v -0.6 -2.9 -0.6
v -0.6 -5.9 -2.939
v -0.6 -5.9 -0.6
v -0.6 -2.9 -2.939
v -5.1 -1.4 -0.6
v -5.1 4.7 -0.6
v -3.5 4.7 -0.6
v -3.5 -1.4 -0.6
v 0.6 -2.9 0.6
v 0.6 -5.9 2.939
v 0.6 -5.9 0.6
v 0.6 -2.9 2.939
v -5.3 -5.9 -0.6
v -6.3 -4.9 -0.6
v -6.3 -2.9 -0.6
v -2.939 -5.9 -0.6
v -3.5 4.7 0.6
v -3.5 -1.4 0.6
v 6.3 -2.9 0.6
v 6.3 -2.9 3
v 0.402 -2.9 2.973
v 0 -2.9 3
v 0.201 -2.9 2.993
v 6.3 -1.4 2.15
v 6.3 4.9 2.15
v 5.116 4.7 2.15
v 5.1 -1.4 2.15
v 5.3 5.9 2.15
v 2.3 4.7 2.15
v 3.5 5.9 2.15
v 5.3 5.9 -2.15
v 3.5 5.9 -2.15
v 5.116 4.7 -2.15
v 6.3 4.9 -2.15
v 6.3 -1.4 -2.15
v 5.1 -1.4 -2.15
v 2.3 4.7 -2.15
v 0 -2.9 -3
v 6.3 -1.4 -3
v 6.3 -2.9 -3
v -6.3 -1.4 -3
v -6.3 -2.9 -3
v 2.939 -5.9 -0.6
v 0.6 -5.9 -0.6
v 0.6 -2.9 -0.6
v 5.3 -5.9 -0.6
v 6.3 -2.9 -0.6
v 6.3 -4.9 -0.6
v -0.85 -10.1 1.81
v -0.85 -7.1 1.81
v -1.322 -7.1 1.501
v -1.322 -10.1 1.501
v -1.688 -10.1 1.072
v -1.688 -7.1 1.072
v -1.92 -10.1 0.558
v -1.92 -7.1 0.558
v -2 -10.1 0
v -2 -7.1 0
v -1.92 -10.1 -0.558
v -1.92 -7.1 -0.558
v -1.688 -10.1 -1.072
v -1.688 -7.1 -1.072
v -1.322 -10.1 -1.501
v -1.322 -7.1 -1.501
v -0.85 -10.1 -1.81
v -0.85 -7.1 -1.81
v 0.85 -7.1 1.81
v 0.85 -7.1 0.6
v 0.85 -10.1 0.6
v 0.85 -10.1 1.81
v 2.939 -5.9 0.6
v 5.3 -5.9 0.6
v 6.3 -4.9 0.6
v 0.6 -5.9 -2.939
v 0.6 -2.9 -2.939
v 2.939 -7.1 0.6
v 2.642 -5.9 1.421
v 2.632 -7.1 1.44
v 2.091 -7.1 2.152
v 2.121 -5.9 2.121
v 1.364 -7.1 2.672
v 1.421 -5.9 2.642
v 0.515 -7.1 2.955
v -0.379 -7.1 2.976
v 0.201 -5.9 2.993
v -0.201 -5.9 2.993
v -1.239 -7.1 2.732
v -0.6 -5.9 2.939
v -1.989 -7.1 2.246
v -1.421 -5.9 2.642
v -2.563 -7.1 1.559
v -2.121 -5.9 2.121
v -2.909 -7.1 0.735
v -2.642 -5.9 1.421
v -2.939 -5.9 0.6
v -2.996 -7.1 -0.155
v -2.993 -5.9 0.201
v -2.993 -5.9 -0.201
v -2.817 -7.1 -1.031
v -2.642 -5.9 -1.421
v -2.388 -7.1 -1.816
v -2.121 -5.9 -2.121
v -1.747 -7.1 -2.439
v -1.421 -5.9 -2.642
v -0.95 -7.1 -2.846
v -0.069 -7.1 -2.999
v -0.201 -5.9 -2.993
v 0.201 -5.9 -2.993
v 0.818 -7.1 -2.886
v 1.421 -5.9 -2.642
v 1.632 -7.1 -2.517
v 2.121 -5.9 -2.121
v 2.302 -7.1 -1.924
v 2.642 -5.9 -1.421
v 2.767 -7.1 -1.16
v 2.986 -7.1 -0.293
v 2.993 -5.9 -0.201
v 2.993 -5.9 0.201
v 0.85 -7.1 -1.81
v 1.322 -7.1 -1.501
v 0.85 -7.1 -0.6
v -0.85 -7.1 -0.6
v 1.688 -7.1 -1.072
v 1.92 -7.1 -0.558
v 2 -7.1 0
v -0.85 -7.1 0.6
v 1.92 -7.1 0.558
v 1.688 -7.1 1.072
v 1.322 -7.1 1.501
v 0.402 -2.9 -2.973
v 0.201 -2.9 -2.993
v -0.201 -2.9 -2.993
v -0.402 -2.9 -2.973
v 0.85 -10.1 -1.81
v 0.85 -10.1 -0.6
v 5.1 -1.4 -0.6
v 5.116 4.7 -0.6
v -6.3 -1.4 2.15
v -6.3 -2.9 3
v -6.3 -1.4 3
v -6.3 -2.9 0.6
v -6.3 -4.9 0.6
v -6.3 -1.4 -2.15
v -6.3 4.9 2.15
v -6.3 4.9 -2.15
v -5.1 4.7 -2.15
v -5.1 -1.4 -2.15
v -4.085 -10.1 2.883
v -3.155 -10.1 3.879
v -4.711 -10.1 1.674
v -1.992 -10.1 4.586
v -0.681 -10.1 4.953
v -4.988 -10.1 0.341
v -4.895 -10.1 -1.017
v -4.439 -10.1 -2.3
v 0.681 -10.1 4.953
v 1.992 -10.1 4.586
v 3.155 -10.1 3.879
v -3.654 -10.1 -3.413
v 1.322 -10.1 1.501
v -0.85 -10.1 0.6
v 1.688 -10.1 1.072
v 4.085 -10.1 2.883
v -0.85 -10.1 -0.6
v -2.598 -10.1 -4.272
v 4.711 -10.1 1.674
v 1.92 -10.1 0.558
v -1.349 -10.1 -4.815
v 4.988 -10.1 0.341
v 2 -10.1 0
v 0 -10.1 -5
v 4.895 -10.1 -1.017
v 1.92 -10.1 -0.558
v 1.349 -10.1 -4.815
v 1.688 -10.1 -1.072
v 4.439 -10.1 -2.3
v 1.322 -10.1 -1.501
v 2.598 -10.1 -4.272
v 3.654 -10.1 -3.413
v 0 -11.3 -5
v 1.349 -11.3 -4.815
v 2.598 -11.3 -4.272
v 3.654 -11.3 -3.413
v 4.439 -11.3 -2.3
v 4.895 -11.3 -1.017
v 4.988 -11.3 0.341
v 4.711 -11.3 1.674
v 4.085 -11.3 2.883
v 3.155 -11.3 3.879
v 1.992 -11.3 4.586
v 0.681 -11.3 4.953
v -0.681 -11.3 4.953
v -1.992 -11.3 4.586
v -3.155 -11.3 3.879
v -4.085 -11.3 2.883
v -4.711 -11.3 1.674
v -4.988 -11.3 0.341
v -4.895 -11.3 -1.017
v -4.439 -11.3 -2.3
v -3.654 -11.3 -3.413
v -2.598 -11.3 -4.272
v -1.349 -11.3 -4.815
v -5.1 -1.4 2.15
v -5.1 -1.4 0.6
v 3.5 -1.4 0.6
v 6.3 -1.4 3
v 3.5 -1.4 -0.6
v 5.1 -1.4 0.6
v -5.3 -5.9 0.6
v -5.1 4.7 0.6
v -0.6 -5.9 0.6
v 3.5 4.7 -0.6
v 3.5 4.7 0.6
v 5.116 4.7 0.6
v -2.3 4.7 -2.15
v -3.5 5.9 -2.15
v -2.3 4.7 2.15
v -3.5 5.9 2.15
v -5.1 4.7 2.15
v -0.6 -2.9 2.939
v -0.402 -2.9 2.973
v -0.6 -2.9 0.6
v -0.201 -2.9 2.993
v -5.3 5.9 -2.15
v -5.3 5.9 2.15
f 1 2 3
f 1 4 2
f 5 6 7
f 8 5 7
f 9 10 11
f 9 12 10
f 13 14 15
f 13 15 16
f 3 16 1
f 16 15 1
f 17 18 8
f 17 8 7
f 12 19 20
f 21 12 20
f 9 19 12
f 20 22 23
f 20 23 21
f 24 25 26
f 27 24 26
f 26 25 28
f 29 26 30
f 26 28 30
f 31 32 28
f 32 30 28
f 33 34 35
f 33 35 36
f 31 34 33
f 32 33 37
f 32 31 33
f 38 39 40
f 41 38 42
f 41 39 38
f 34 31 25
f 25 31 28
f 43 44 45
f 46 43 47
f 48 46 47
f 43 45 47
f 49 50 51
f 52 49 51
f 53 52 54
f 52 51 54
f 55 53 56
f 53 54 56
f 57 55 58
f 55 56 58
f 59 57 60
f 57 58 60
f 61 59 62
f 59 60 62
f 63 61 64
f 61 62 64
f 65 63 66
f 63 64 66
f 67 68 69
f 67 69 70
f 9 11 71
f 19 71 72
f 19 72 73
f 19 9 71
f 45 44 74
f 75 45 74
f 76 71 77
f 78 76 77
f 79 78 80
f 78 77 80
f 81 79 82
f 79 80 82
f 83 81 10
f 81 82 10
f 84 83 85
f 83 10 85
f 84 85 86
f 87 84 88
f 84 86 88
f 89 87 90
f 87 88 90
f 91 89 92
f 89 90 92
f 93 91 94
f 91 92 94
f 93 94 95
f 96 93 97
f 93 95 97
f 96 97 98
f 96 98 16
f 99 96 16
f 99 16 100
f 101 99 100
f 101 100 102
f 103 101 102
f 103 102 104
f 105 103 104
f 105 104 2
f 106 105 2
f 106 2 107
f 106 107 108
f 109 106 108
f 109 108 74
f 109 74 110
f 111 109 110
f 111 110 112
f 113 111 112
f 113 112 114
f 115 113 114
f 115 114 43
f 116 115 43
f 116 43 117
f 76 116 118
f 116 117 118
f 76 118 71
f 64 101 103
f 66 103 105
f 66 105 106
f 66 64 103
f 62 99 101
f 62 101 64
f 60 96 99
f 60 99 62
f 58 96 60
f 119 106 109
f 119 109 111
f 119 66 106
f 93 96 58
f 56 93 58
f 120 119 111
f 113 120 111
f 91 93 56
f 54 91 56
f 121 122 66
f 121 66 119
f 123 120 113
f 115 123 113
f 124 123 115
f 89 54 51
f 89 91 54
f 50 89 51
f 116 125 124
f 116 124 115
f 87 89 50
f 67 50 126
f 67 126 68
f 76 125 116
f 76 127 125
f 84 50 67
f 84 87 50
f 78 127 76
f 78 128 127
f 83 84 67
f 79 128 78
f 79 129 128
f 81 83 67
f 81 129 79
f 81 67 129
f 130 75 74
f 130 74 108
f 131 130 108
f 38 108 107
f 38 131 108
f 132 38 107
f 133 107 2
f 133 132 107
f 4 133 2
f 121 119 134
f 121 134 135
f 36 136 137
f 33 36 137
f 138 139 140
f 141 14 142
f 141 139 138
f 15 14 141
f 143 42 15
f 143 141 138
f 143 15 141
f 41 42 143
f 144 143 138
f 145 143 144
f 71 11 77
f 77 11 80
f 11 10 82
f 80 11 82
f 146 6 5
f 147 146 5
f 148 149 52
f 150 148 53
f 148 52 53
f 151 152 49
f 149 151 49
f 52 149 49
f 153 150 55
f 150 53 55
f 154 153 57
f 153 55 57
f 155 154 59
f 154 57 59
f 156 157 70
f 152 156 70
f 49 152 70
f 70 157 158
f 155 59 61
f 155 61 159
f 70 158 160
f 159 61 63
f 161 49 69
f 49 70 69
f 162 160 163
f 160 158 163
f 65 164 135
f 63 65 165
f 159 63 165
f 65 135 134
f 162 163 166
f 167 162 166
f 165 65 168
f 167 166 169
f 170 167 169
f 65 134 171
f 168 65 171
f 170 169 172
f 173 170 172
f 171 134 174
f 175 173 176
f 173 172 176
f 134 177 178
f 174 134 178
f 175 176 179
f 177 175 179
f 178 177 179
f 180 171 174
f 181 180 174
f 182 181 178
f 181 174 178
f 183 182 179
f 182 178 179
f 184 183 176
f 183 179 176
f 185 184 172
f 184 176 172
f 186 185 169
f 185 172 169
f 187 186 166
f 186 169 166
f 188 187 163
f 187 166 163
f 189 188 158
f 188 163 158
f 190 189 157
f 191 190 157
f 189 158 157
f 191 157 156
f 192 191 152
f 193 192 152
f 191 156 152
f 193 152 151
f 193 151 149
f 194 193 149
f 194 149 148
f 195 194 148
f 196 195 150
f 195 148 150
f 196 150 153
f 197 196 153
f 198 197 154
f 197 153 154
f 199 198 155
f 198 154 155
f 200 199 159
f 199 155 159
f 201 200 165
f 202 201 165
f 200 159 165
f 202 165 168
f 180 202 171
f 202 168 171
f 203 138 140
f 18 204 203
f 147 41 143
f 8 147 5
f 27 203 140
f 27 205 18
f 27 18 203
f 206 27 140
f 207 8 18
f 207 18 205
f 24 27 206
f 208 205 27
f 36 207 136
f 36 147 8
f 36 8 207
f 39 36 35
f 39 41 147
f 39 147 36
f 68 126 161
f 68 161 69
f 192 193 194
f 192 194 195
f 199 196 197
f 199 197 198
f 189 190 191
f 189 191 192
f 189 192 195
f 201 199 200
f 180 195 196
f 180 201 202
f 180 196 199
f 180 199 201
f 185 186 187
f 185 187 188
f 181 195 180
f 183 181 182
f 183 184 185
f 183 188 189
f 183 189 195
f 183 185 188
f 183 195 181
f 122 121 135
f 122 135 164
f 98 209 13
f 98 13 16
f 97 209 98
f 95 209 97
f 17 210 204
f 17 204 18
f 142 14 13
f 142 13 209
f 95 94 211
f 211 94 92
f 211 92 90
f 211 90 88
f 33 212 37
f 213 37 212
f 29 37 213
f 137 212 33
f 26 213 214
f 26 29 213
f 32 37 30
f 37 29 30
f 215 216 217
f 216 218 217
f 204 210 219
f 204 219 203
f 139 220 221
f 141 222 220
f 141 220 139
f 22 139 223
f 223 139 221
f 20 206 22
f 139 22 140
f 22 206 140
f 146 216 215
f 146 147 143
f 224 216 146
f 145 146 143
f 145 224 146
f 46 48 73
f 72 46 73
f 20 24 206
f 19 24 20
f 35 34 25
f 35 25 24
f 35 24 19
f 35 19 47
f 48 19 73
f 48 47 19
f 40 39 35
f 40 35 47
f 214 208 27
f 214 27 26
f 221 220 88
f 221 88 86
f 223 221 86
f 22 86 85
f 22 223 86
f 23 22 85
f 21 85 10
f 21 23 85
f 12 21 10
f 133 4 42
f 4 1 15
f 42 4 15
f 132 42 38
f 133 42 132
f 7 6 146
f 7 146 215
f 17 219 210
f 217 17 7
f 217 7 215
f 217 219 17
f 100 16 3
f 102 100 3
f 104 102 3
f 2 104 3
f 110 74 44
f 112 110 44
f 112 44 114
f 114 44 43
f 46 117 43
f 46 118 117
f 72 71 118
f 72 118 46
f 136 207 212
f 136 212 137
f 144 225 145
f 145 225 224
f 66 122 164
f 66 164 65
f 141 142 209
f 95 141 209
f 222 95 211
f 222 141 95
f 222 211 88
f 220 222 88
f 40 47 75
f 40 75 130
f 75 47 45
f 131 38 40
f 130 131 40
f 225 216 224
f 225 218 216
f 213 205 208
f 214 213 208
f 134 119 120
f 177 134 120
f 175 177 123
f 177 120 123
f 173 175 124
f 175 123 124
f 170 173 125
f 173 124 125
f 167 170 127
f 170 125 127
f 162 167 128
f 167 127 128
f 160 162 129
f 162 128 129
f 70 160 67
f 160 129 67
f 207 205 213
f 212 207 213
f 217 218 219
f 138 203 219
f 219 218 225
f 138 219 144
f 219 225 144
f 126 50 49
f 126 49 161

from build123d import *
from build123d.topology import SkipClean

# Parameters (mm, degrees)
SKETCH1_W           = 2.8
SKETCH1_H           = 1.2
SKETCH1_H_2         = 6.1
SKETCH1_H_3         = 4.5
SKETCH1_W_2         = 1.2
SKETCH1_W_3         = 4.6
BOSS_EXTRUDE1_DEPTH = 0.6
BOSS_EXTRUDE2_DEPTH = 1.55
BOSS_EXTRUDE3_DEPTH = 0.85
SKETCH6_R           = 3
BOSS_EXTRUDE4_DEPTH = 1.2
BOSS_EXTRUDE5_START = 3
BOSS_EXTRUDE5_DEPTH = 3
SKETCH8_R           = 2
BOSS_EXTRUDE6_DEPTH = 3
CUT_EXTRUDE1_START  = -3
CUT_EXTRUDE1_DEPTH  = 3
SKETCH10_R          = 5
BOSS_EXTRUDE7_DEPTH = 1.2
CHAMFER1_SIZE       = 1


with BuildPart() as part:
    # Sketch1 → Boss-Extrude1 (new, symmetric)
    with BuildSketch(Plane.XY):
        with Locations((-4.9, 5.3)):
            Rectangle(SKETCH1_W, SKETCH1_H)
        Polygon((-2.3, 4.7), (-3.5, 5.9), (-3.5, 4.7), align=None)
        with Locations((-4.9, 1.65)):
            Rectangle(SKETCH1_W, SKETCH1_H_2)
        with Locations((-4.9, -3.65)):
            Rectangle(SKETCH1_W, SKETCH1_H_3)
        with Locations((-2.9, -3.65)):
            Rectangle(SKETCH1_W_2, SKETCH1_H_3)
        with Locations((0, -3.65)):
            Rectangle(SKETCH1_W_3, SKETCH1_H_3)
        with Locations((2.9, -3.65)):
            Rectangle(SKETCH1_W_2, SKETCH1_H_3)
        with Locations((4.9, -3.65)):
            Rectangle(SKETCH1_W, SKETCH1_H_3)
        with Locations((4.9, 1.65)):
            Rectangle(SKETCH1_W, SKETCH1_H_2)
        Polygon((3.5, 5.9), (2.3, 4.7), (3.5, 4.7), align=None)
        with Locations((4.9, 5.3)):
            Rectangle(SKETCH1_W, SKETCH1_H)
    extrude(amount=BOSS_EXTRUDE1_DEPTH, both=True)

    # Sketch3 → Boss-Extrude2 (add)
    with BuildSketch(Plane.XY.offset(0.6)):
        Polygon((-6.3, 4.7), (-6.3, 5.9), (-5.1, 5.9), (-3.5, 5.9), (-2.3, 4.7), (-3.5, 4.7), (-5.1, 4.7), (-5.1, -1.4), (3.5, -1.4), (5.1, -1.4), (5.115943, 4.7), (3.5, 4.7), (2.3, 4.7), (3.5, 5.9), (6.3, 5.9), (6.3, -2.9), (-6.3, -2.9), align=None)
    boss_extrude2 = extrude(amount=BOSS_EXTRUDE2_DEPTH)

    # Mirror1: Boss-Extrude2 across plane
    add(boss_extrude2.mirror(Plane.XY))

    # Sketch5 → Boss-Extrude3 (add)
    with BuildSketch(Plane(origin=(0, 0, -2.15), x_dir=(-1, 0, 0), z_dir=(0, 0, -1))):
        Polygon((-5.1, -1.4), (-6.3, -1.4), (-6.3, -2.9), (6.3, -2.9), (6.3, -1.4), align=None)
    boss_extrude3 = extrude(amount=BOSS_EXTRUDE3_DEPTH)

    # Mirror2: Boss-Extrude3 across plane
    add(boss_extrude3.mirror(Plane.XY))

    # Sketch6 → Boss-Extrude4 (add)
    with BuildSketch(Plane.XZ.offset(5.9)):
        with Locations(Location((0, 0, 0), (0, 0, 11.536959))):
            Circle(SKETCH6_R)
    extrude(amount=BOSS_EXTRUDE4_DEPTH)

    # Sketch7 → Boss-Extrude5 (add)
    with SkipClean():  # the faces are left unmerged after this step: merging them gives an invalid solid
        with BuildSketch(Plane(origin=(0, -5.9, 0), x_dir=(1, 0, 0), z_dir=(0, 1, 0)).offset(BOSS_EXTRUDE5_START)):
            with BuildLine():
                Line((-0.6, 0.6), (-0.6, -2.939388))
                ThreePointArc((-0.6, -2.939388), (0, -3), (0.6, -2.939388))
                Line((0.6, -2.939388), (0.6, 0.6))
                Line((0.6, 0.6), (-0.6, 0.6))
            make_face()
            with BuildLine():
                Line((-0.6, 2.939388), (-0.6, 0.6))
                Line((-0.6, 0.6), (0.6, 0.6))
                Line((0.6, 0.6), (0.6, 2.939388))
                ThreePointArc((0.6, 2.939388), (0, 3), (-0.6, 2.939388))
            make_face()
        extrude(amount=-BOSS_EXTRUDE5_DEPTH)

    # Sketch8 → Boss-Extrude6 (add)
    with SkipClean():  # the faces are left unmerged after this step: merging them gives an invalid solid
        with BuildSketch(Plane.XZ.offset(7.1)):
            with Locations(Location((0, 0, 0), (0, 0, 270))):
                Circle(SKETCH8_R)
        extrude(amount=BOSS_EXTRUDE6_DEPTH)

    # Sketch9 → Cut-Extrude1 (cut)
    with SkipClean():  # the faces are left unmerged after this step: merging them gives an invalid solid
        with BuildSketch(Plane.XZ.offset(10.1).offset(CUT_EXTRUDE1_START)):
            with BuildLine():
                Line((-0.85, -0.6), (-0.85, -1.810387))
                ThreePointArc((-0.85, -1.810387), (0, -2), (0.85, -1.810387))
                Line((0.85, -1.810387), (0.85, -0.6))
                Line((0.85, -0.6), (-0.85, -0.6))
            make_face()
            with BuildLine():
                ThreePointArc((0.85, 1.810387), (0, 2), (-0.85, 1.810387))
                Line((-0.85, 1.810387), (-0.85, 0.6))
                Line((-0.85, 0.6), (0.85, 0.6))
                Line((0.85, 0.6), (0.85, 1.810387))
            make_face()
        extrude(amount=CUT_EXTRUDE1_DEPTH, mode=Mode.SUBTRACT)

    # Sketch10 → Boss-Extrude7 (add)
    with SkipClean():  # the faces are left unmerged after this step: merging them gives an invalid solid
        with BuildSketch(Plane.XZ.offset(10.1)):
            with Locations(Location((0, 0, 0), (0, 0, 270))):
                Circle(SKETCH10_R)
        extrude(amount=BOSS_EXTRUDE7_DEPTH)

    # Chamfer1
    chamfer1_edges = [part.edges().sort_by_distance(p)[0] for p in [
        (-6.3, 5.9, 0),
        (6.3, 5.9, 0),
        (6.3, -5.9, 0),
        (-6.3, -5.9, 0),
    ]]
    chamfer(chamfer1_edges, length=CHAMFER1_SIZE)


solid = part.part
